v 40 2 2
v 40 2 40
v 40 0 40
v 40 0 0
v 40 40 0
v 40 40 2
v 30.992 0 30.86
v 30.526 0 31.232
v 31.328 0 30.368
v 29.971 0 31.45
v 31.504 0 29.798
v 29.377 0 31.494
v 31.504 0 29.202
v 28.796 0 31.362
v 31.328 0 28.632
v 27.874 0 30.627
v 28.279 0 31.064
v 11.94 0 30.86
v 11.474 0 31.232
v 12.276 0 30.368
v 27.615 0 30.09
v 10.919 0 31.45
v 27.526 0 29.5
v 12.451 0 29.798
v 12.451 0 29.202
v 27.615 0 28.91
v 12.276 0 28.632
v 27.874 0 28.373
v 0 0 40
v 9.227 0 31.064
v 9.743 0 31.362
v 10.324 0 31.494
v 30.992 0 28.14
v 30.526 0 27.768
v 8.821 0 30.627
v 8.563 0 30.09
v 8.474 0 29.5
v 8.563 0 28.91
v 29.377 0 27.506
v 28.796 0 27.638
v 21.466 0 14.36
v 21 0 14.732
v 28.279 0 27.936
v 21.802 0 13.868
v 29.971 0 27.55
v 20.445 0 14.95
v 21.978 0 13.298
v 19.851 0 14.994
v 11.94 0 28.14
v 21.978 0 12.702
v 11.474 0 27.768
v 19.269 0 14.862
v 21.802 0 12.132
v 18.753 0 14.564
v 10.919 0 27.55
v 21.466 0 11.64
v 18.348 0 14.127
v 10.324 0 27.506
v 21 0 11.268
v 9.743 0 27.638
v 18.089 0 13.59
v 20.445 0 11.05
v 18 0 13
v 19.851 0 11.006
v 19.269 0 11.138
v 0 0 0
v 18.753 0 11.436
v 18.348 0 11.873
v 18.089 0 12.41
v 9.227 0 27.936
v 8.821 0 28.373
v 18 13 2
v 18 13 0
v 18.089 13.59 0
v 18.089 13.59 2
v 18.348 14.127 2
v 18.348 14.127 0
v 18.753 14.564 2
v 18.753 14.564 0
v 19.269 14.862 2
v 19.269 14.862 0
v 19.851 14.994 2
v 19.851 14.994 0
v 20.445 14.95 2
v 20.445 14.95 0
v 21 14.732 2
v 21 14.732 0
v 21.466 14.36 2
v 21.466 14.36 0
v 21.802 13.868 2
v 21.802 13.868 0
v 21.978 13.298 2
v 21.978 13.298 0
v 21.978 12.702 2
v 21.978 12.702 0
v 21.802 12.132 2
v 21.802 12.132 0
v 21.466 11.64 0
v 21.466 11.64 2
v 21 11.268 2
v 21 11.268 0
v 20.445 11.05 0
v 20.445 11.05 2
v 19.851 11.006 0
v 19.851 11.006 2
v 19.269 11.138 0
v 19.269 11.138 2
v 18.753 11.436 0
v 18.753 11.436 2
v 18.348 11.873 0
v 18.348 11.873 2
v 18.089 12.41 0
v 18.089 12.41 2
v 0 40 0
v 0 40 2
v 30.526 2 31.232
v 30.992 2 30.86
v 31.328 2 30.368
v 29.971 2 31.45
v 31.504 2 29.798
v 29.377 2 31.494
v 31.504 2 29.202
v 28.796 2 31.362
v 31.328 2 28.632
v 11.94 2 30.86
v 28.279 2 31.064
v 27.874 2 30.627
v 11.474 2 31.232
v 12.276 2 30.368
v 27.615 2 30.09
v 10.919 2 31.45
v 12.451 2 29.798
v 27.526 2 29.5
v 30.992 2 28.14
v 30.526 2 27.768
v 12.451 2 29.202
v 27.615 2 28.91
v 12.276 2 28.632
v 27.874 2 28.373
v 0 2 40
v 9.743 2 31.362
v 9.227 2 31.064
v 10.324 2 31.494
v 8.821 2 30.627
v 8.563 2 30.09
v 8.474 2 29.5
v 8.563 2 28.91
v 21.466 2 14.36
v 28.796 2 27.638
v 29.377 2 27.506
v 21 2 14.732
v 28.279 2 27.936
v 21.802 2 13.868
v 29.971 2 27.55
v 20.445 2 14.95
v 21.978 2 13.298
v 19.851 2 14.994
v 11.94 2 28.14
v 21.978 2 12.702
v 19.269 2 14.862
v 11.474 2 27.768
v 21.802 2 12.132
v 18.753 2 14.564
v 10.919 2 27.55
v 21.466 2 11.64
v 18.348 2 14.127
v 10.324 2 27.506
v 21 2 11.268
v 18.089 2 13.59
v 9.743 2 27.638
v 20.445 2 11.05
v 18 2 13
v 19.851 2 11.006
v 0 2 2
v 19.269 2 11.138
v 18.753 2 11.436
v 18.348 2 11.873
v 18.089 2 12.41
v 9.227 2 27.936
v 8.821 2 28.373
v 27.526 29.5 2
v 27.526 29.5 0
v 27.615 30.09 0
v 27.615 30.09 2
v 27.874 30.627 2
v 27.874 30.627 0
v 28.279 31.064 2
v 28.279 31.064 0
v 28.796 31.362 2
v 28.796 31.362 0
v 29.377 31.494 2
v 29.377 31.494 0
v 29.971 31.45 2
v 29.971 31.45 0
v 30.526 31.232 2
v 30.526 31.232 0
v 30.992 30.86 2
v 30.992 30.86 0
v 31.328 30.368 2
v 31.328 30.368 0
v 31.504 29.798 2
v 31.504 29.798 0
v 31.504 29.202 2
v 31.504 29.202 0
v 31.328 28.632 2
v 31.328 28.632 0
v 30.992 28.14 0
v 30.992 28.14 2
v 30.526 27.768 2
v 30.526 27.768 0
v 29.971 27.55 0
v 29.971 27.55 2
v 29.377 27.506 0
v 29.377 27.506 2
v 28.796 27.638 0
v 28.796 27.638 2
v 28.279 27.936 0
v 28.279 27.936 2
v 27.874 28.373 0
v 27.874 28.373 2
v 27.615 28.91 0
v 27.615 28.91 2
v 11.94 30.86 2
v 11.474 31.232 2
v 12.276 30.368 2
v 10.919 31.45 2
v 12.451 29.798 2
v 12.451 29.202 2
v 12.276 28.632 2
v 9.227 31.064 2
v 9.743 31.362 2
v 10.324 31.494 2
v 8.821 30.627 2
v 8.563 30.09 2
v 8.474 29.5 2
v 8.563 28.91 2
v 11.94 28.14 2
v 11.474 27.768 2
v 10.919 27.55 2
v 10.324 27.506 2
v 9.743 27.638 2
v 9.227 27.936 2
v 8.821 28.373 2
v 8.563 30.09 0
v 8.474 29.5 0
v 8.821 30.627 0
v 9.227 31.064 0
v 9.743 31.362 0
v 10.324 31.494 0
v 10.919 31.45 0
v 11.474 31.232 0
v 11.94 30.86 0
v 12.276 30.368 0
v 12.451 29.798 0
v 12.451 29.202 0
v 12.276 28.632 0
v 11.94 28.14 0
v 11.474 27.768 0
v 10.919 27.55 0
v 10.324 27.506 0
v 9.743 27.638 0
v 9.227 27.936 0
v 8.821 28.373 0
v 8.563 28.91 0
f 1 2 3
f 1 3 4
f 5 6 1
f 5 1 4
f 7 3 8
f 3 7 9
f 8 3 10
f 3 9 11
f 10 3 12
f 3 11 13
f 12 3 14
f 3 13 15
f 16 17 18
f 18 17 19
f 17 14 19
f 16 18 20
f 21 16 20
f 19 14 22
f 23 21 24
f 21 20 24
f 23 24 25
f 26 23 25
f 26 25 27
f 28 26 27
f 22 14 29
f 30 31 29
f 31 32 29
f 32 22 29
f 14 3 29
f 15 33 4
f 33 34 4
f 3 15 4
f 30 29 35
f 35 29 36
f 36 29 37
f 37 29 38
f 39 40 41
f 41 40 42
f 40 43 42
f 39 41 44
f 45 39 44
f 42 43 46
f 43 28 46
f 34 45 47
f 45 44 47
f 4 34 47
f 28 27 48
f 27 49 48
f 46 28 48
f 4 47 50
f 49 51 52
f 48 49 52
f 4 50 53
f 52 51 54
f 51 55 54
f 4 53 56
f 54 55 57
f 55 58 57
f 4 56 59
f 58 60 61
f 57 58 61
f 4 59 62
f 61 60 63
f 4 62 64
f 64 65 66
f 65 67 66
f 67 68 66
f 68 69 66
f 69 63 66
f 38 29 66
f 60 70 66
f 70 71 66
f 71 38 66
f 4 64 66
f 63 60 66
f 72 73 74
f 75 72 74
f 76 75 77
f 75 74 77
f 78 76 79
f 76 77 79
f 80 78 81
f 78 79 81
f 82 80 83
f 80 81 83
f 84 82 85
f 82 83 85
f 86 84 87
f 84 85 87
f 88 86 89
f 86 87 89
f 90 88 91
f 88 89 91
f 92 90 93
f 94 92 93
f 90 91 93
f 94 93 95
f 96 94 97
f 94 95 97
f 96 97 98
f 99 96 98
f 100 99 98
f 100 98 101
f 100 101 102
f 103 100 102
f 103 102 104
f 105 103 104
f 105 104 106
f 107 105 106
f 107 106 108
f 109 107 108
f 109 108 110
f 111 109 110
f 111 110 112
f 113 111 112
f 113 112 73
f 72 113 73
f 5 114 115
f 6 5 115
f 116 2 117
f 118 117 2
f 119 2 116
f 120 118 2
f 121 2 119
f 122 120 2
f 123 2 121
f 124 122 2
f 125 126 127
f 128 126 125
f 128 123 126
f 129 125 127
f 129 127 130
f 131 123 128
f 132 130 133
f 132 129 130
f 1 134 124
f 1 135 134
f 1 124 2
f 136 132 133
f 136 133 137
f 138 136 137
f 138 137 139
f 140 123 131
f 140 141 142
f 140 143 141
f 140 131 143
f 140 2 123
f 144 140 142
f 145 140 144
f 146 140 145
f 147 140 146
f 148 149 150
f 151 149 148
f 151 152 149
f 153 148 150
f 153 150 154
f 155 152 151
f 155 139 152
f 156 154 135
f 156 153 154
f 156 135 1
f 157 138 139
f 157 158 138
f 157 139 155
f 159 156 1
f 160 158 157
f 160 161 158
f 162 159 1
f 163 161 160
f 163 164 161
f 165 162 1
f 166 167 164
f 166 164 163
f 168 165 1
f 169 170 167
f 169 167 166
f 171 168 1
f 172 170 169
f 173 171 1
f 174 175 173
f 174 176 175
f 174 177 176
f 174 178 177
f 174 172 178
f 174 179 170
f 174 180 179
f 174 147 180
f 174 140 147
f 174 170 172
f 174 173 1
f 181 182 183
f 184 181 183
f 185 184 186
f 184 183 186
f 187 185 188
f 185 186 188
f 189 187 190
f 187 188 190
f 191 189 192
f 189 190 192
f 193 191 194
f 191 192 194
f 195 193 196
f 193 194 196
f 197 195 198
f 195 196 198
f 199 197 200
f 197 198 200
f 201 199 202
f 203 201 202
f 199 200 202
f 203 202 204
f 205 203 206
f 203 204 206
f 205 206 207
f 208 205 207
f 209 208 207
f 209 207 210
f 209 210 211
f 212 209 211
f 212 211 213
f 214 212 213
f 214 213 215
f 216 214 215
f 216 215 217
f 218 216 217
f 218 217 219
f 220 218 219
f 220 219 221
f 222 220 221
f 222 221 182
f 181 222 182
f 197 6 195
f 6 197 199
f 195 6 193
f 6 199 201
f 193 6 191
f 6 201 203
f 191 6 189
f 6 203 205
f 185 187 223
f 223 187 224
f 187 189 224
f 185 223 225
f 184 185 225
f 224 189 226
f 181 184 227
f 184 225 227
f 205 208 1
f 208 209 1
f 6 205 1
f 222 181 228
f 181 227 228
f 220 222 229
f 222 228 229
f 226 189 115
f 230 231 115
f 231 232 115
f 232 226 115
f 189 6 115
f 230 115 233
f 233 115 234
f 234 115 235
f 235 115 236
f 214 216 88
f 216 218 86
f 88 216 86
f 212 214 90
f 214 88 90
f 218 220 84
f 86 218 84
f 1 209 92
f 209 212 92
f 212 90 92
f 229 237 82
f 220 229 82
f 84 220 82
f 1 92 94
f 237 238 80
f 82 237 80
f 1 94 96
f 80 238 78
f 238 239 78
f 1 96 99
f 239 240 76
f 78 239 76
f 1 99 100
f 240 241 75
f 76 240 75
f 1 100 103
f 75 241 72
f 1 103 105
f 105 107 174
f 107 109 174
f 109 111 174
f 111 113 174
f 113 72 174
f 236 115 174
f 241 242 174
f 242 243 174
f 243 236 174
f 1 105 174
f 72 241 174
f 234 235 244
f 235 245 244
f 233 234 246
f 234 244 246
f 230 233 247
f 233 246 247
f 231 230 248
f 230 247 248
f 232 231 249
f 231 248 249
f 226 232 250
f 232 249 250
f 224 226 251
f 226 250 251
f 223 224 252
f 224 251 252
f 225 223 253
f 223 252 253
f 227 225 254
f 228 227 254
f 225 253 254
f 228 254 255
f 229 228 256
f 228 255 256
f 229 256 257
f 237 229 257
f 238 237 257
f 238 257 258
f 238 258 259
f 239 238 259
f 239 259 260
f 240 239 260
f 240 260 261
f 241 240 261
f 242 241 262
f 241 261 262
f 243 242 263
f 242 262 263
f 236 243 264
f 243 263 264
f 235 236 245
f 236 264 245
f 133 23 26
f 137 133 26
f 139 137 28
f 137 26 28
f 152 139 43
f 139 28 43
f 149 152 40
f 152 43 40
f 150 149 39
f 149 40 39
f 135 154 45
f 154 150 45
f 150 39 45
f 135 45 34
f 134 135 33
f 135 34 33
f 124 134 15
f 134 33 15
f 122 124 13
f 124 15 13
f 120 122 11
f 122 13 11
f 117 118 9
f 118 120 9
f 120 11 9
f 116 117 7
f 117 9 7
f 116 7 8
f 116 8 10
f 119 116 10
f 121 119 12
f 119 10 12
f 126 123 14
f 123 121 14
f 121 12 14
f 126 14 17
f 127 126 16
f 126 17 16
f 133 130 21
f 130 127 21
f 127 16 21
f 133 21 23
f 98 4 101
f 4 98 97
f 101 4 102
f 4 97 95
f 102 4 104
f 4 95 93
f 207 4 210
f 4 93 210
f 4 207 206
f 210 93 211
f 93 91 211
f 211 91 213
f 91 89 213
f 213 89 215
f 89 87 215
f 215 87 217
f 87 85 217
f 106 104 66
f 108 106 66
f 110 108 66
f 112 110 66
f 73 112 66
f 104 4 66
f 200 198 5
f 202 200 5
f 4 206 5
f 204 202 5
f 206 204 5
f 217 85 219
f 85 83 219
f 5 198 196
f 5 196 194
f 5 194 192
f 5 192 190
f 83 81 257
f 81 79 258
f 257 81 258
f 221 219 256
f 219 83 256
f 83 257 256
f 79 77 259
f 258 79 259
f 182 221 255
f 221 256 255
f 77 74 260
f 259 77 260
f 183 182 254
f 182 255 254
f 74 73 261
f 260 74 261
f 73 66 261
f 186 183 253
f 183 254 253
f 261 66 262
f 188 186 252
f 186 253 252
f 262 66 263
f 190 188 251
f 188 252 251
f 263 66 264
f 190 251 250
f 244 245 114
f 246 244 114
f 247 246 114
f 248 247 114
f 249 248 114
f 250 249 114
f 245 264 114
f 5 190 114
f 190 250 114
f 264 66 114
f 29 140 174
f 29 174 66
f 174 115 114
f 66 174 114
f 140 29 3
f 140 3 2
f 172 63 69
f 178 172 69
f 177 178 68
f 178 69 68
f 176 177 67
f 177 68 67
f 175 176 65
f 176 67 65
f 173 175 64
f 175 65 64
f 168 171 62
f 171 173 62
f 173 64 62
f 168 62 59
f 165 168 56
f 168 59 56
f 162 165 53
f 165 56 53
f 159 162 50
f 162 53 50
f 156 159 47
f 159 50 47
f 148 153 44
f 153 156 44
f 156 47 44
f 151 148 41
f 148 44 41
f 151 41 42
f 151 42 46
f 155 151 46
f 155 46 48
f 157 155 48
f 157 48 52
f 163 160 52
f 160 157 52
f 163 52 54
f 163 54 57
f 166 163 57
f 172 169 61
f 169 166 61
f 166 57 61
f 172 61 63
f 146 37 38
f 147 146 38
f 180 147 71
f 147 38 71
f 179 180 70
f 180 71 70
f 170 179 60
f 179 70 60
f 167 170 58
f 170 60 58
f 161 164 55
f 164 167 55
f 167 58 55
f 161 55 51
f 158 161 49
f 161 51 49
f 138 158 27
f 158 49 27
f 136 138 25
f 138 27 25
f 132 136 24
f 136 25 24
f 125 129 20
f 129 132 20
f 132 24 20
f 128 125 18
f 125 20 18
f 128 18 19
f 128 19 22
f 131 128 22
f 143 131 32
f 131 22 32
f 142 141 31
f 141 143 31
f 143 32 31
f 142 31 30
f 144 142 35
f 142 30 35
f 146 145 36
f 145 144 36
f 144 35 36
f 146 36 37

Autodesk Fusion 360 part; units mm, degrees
sketch "Sketch1" plane through (0, 0, 0) normal (1, 0, 0) x (0, 0, -1)
  line L0 (0, 40) -> (-2, 40)
  line L1 (-2, 40) -> (-2, 0)
  line L2 (-2, 0) -> (0, 0)
  line L3 (0, 0) -> (0, 40)
  line L4 (0, 0) -> (-40, 0)
  line L5 (-40, 0) -> (-40, 2)
  line L6 (-40, 2) -> (0, 2)
  line L7 (0, 2) -> (0, 0)
  dimension "d1" = 2
  dimension "d2" = 40
extrude "Extrude1" add sketch "Sketch1" along normal blind 40
sketch "Sketch2" plane through (0, 0, 0) normal (0, 0, -1) x (-1, 0, 0)
  circle A0 centre (-20, 13) radius 2
  circle A1 centre (-10.4737, 29.5) radius 2
  circle A2 centre (-29.5263, 29.5) radius 2
  point P0 (-20, 24)
  dimension "d5" = 4
  dimension "d8" = 360
extrude "Extrude2" cut sketch "Sketch2" against normal blind 2
ref_plane "WorkPlane1" through (0, 2, 2) normal (0, -0.7071, 0.7071) x (1, 0, 0)
mirror "Mirror1" about plane through (0, 2, 2) normal (0, -0.7071, 0.7071) of "Extrude2"
